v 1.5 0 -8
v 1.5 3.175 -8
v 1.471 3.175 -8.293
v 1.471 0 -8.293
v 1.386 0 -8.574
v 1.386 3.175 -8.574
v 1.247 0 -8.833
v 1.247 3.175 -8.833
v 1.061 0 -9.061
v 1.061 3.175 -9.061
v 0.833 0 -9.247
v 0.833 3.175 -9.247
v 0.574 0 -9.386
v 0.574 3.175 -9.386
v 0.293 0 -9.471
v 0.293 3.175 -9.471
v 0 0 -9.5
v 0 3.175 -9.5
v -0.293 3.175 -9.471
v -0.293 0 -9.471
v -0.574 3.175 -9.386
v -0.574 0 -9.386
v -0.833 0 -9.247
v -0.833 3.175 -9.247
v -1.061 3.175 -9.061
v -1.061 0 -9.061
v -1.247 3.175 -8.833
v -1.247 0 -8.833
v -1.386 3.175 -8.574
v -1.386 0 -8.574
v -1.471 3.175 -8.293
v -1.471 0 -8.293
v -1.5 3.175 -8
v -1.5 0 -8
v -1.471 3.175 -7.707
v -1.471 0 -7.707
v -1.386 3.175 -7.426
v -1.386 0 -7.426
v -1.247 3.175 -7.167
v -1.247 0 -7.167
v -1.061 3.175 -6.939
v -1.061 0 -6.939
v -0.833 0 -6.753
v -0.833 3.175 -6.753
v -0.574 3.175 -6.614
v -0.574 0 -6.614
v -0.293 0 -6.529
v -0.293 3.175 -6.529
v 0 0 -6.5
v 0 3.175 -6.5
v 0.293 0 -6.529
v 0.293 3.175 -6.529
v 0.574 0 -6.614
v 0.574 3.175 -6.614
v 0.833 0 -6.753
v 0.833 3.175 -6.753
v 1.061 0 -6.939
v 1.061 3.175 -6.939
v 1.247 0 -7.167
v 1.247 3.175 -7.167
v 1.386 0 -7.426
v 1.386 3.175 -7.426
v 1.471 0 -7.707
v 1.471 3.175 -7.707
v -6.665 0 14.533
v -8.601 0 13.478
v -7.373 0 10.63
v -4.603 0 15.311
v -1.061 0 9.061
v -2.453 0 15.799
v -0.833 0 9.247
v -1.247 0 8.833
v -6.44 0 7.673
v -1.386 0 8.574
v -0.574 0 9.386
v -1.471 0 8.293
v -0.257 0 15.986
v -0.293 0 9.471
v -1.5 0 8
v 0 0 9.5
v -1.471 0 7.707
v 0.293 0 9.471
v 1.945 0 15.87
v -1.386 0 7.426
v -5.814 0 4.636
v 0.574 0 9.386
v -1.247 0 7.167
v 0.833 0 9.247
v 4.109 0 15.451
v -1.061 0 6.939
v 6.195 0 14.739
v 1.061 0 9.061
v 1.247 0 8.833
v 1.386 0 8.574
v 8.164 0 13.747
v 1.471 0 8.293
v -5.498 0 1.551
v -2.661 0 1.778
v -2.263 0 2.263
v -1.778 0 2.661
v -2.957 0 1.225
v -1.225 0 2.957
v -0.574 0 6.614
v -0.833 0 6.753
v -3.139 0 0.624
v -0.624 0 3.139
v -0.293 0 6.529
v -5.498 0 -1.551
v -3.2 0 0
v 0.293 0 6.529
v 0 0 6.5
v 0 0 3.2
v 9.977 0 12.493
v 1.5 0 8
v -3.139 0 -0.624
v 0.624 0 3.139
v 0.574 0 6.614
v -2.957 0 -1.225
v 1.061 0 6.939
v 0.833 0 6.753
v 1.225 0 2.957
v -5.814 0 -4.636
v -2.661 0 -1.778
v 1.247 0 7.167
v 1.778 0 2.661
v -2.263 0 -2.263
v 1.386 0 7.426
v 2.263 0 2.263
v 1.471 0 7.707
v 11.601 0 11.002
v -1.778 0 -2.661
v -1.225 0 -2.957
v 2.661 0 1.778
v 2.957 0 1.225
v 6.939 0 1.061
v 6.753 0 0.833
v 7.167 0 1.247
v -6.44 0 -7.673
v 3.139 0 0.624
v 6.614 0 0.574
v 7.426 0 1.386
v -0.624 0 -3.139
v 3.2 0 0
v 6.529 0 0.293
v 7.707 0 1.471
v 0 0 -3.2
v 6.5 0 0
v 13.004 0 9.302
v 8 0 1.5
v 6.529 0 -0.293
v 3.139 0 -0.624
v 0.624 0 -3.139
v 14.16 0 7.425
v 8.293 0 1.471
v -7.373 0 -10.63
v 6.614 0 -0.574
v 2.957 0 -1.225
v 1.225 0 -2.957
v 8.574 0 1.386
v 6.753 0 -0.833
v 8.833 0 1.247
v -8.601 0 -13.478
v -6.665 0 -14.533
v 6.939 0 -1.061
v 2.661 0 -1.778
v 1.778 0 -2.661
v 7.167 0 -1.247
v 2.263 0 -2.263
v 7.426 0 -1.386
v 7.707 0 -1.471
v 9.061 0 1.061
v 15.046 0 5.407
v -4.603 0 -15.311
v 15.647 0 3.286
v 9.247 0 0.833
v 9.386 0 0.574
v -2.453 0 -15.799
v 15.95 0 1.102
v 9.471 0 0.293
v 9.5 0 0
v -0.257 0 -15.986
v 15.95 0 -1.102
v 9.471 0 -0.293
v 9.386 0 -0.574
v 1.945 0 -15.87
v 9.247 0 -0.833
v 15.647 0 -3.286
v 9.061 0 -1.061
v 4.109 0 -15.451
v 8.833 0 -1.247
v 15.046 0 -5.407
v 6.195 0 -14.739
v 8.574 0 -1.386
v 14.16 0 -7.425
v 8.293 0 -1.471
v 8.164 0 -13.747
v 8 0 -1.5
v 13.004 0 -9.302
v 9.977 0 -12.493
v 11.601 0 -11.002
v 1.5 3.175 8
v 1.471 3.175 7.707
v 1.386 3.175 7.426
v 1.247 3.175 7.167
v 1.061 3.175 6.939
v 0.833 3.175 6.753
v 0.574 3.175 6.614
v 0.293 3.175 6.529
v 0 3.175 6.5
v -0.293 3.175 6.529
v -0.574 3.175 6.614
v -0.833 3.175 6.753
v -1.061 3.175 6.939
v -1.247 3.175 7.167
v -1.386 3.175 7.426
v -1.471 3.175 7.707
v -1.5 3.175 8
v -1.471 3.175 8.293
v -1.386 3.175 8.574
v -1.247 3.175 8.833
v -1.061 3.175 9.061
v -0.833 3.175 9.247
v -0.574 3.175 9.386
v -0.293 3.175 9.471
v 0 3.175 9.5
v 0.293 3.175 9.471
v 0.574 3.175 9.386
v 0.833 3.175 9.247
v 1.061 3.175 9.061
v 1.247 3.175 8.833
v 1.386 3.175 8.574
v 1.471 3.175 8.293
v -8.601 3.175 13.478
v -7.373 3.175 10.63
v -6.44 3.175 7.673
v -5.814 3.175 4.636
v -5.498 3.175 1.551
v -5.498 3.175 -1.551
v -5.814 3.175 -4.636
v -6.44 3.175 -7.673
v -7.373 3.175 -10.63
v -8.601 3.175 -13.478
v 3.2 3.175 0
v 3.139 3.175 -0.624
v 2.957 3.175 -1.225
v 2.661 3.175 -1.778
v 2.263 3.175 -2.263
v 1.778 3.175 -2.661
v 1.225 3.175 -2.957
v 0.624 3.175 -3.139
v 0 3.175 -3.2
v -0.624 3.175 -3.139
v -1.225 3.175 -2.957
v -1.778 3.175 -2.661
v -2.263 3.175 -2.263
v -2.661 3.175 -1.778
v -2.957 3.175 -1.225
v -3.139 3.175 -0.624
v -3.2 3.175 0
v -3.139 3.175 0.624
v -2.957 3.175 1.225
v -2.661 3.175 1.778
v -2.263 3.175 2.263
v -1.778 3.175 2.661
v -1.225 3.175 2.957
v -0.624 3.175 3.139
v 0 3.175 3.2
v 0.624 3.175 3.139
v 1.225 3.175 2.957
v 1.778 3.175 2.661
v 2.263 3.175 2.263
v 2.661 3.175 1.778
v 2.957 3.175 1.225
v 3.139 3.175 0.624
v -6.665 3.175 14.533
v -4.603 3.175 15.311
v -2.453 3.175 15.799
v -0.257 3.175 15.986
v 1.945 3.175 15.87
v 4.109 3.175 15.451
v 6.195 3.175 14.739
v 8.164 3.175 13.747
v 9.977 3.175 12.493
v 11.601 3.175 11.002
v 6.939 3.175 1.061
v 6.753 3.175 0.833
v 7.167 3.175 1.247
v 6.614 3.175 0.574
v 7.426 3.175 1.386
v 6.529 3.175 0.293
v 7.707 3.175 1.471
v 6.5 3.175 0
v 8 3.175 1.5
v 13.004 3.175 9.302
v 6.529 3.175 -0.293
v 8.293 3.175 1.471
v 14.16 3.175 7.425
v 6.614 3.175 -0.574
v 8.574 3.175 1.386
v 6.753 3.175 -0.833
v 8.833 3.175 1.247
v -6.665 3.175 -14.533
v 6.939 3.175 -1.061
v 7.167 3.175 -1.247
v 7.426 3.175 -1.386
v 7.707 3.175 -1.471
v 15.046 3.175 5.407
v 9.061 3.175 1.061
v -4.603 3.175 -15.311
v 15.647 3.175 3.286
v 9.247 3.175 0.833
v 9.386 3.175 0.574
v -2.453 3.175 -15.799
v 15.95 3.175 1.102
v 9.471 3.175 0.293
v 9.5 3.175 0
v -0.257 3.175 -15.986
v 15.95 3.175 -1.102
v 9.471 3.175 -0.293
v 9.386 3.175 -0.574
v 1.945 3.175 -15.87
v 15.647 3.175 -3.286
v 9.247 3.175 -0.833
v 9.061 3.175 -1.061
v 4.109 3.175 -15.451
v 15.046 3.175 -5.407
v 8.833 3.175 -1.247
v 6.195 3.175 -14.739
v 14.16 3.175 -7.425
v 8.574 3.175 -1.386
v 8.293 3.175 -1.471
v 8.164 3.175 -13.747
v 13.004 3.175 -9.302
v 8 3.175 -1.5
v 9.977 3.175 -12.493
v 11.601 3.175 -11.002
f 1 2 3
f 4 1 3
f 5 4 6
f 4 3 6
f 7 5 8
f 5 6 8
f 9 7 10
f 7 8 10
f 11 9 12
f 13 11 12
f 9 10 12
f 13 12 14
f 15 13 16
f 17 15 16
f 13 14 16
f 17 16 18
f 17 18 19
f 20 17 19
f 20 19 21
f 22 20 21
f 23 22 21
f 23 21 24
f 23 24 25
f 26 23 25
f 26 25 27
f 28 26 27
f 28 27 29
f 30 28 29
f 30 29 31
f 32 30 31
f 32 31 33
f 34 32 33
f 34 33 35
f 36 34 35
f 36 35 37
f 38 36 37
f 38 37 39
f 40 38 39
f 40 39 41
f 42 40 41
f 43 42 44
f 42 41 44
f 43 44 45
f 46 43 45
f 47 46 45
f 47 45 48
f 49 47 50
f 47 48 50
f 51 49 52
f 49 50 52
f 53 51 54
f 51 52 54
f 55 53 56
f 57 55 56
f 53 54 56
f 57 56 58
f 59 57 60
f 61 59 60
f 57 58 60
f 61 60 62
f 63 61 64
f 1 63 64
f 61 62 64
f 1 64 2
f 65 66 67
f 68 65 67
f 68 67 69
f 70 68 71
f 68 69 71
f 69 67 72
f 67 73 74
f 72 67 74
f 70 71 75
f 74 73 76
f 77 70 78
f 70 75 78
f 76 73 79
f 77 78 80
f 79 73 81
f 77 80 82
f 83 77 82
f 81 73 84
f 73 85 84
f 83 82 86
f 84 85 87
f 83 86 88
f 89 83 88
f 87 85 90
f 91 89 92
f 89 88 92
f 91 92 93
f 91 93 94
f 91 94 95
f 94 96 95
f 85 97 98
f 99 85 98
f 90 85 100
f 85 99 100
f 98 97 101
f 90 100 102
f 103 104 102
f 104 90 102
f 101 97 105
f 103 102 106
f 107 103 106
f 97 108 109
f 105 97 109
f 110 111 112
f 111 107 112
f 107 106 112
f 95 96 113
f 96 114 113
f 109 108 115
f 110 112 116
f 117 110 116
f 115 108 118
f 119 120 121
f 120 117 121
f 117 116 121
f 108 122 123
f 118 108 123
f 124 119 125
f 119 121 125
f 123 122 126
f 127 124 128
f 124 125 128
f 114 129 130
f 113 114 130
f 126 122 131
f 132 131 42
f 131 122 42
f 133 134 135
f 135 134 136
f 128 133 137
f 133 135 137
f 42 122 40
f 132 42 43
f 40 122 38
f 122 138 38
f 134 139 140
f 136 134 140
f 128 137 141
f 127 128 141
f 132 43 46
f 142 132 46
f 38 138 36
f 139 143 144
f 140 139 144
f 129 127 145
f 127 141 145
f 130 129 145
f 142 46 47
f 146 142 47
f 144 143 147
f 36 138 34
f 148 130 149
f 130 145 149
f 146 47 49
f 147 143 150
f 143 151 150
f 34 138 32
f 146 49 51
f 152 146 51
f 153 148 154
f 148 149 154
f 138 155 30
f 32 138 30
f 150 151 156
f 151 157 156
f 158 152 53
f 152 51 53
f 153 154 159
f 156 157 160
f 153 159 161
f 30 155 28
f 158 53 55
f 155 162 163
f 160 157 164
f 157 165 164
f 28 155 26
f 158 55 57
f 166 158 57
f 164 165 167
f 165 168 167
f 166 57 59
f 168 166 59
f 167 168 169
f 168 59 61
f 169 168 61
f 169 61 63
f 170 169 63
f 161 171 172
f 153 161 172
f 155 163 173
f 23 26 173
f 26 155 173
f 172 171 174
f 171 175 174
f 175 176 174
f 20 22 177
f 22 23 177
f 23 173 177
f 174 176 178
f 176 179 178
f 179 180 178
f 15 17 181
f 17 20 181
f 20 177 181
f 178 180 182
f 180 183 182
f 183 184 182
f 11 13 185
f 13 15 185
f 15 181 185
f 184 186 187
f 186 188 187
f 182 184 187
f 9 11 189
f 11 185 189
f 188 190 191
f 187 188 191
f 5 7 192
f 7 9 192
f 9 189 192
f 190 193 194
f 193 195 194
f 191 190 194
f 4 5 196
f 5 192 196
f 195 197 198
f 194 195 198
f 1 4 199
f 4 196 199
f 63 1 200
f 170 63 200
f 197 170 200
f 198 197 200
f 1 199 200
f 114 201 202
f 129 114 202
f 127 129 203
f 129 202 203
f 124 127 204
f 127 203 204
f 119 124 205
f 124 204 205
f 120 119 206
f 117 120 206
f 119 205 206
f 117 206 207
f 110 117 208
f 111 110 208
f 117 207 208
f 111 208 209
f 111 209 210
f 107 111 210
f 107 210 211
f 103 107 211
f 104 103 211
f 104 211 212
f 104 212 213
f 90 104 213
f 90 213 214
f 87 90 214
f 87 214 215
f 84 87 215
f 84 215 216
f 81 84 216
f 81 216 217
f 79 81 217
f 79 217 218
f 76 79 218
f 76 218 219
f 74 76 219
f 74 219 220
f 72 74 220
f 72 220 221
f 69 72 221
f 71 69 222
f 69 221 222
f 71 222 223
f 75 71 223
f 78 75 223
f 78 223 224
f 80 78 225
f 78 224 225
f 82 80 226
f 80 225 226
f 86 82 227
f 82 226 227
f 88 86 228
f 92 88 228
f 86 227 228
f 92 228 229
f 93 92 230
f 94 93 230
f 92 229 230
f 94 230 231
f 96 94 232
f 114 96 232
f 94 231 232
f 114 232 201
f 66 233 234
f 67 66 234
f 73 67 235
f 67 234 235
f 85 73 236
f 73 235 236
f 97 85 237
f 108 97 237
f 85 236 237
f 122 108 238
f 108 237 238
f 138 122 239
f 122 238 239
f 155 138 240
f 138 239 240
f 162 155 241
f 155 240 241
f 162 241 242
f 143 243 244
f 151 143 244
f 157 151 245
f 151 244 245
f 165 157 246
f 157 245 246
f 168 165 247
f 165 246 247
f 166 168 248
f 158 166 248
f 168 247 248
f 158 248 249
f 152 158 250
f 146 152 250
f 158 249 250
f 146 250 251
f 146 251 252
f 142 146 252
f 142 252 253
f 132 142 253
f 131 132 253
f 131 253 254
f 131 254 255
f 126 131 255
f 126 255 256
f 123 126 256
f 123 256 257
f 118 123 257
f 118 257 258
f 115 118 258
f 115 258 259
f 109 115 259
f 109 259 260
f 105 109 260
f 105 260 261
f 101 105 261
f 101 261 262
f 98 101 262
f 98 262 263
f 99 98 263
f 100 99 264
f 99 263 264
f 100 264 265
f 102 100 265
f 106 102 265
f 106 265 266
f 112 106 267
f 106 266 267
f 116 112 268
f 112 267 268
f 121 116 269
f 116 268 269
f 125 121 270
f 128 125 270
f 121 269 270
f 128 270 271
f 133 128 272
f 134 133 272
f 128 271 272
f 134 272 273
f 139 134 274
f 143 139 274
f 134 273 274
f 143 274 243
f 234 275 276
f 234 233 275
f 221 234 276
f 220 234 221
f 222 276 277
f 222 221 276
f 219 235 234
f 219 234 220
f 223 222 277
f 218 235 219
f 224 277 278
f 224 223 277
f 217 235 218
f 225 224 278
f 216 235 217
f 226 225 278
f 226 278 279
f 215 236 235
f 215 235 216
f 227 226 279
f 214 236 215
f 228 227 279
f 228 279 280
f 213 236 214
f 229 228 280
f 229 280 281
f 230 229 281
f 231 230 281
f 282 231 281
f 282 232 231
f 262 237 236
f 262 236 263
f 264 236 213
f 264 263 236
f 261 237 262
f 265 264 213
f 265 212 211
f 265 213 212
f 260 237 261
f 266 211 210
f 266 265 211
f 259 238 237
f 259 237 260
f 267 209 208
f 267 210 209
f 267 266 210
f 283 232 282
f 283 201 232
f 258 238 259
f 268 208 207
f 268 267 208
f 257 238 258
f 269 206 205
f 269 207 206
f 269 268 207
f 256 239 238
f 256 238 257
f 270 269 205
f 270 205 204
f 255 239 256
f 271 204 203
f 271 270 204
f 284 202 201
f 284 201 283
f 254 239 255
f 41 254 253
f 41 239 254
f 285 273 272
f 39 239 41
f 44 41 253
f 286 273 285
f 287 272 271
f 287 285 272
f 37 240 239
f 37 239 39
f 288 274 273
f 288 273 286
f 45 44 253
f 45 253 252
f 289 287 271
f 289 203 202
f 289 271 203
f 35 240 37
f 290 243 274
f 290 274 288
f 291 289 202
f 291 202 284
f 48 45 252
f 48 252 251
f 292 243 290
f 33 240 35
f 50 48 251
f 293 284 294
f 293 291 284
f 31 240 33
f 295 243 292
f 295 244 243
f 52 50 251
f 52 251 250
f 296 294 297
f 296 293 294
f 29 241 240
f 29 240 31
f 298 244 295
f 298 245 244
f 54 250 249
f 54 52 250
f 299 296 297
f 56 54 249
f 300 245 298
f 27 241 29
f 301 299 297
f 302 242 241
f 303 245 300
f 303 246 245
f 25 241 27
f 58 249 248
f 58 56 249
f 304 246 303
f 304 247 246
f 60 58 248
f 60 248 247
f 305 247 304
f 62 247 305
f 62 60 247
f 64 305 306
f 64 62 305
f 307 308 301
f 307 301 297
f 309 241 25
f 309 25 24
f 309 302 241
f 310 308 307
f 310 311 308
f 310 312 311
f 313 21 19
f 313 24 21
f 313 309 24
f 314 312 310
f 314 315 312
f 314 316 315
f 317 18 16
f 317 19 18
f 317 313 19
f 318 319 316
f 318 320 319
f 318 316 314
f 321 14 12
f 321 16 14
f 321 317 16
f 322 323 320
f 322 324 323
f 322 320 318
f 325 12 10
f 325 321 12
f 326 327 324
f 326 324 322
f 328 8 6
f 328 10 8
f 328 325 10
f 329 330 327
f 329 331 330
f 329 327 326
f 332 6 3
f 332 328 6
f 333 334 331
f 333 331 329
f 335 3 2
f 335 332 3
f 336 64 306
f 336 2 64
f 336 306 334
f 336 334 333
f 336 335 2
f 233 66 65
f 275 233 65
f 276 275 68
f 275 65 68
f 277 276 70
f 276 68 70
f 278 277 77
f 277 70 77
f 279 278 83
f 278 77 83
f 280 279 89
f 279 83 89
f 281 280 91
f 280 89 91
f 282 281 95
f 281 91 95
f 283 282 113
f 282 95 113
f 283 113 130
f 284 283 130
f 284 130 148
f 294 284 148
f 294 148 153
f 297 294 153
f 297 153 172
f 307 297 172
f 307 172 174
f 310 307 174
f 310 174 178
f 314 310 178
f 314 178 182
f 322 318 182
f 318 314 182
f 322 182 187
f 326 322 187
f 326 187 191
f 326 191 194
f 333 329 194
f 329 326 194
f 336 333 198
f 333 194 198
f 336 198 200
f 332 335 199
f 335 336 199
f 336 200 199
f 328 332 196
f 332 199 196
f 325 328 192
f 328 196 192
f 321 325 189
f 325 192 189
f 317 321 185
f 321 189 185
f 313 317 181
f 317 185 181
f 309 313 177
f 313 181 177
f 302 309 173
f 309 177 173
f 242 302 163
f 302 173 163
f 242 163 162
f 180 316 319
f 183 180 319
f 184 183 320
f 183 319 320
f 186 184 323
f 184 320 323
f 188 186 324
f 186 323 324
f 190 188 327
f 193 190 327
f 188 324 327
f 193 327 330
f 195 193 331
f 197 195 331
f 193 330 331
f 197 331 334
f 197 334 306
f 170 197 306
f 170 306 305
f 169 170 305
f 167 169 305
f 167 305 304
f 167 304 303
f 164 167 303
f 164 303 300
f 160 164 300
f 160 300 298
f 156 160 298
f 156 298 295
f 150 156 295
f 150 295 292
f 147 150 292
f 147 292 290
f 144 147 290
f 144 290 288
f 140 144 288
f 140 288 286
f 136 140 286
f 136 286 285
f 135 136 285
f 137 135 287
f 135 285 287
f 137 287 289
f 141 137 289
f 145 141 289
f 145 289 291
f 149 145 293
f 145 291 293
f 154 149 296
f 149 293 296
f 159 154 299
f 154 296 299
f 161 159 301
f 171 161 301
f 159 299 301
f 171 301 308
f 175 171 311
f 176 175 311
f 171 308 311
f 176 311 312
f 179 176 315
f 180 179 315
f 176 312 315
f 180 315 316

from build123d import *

# Parameters (mm, degrees)
SKETCH1_R           = 15.988284
BOSS_EXTRUDE1_DEPTH = 3.175
SKETCH2_R           = 30.48
CUT_EXTRUDE1_DEPTH  = 4.175
SKETCH4_R           = 1.499997
SKETCH4_R_2         = 3.2004
CUT_EXTRUDE2_DEPTH  = 4.175


with BuildPart() as part:
    # Sketch1 → Boss-Extrude1 (new body)
    with BuildSketch(Plane(origin=(0, 0, 0), x_dir=(1, 0, 0), z_dir=(0, 1, 0))):
        Circle(SKETCH1_R)
    extrude(amount=BOSS_EXTRUDE1_DEPTH)

    # Sketch2 → Cut-Extrude1 (cut, through all)
    with BuildSketch(Plane(origin=(0, 3.175, 0), x_dir=(1, 0, 0), z_dir=(0, 1, 0))):
        with Locations((-35.938985022, 0)):
            Circle(SKETCH2_R)
    extrude(amount=-CUT_EXTRUDE1_DEPTH, mode=Mode.SUBTRACT)

    # Sketch4 → Cut-Extrude2 (cut, through all)
    with BuildSketch(Plane(origin=(0, 3.175, 0), x_dir=(1, 0, 0), z_dir=(0, 1, 0))):
        with Locations((0, 7.999984)):
            Circle(SKETCH4_R)
        with Locations((0, -7.999984)):
            Circle(SKETCH4_R)
        with Locations((7.999984, 0)):
            Circle(SKETCH4_R)
        Circle(SKETCH4_R_2)
    extrude(amount=-CUT_EXTRUDE2_DEPTH, mode=Mode.SUBTRACT)


solid = part.part
